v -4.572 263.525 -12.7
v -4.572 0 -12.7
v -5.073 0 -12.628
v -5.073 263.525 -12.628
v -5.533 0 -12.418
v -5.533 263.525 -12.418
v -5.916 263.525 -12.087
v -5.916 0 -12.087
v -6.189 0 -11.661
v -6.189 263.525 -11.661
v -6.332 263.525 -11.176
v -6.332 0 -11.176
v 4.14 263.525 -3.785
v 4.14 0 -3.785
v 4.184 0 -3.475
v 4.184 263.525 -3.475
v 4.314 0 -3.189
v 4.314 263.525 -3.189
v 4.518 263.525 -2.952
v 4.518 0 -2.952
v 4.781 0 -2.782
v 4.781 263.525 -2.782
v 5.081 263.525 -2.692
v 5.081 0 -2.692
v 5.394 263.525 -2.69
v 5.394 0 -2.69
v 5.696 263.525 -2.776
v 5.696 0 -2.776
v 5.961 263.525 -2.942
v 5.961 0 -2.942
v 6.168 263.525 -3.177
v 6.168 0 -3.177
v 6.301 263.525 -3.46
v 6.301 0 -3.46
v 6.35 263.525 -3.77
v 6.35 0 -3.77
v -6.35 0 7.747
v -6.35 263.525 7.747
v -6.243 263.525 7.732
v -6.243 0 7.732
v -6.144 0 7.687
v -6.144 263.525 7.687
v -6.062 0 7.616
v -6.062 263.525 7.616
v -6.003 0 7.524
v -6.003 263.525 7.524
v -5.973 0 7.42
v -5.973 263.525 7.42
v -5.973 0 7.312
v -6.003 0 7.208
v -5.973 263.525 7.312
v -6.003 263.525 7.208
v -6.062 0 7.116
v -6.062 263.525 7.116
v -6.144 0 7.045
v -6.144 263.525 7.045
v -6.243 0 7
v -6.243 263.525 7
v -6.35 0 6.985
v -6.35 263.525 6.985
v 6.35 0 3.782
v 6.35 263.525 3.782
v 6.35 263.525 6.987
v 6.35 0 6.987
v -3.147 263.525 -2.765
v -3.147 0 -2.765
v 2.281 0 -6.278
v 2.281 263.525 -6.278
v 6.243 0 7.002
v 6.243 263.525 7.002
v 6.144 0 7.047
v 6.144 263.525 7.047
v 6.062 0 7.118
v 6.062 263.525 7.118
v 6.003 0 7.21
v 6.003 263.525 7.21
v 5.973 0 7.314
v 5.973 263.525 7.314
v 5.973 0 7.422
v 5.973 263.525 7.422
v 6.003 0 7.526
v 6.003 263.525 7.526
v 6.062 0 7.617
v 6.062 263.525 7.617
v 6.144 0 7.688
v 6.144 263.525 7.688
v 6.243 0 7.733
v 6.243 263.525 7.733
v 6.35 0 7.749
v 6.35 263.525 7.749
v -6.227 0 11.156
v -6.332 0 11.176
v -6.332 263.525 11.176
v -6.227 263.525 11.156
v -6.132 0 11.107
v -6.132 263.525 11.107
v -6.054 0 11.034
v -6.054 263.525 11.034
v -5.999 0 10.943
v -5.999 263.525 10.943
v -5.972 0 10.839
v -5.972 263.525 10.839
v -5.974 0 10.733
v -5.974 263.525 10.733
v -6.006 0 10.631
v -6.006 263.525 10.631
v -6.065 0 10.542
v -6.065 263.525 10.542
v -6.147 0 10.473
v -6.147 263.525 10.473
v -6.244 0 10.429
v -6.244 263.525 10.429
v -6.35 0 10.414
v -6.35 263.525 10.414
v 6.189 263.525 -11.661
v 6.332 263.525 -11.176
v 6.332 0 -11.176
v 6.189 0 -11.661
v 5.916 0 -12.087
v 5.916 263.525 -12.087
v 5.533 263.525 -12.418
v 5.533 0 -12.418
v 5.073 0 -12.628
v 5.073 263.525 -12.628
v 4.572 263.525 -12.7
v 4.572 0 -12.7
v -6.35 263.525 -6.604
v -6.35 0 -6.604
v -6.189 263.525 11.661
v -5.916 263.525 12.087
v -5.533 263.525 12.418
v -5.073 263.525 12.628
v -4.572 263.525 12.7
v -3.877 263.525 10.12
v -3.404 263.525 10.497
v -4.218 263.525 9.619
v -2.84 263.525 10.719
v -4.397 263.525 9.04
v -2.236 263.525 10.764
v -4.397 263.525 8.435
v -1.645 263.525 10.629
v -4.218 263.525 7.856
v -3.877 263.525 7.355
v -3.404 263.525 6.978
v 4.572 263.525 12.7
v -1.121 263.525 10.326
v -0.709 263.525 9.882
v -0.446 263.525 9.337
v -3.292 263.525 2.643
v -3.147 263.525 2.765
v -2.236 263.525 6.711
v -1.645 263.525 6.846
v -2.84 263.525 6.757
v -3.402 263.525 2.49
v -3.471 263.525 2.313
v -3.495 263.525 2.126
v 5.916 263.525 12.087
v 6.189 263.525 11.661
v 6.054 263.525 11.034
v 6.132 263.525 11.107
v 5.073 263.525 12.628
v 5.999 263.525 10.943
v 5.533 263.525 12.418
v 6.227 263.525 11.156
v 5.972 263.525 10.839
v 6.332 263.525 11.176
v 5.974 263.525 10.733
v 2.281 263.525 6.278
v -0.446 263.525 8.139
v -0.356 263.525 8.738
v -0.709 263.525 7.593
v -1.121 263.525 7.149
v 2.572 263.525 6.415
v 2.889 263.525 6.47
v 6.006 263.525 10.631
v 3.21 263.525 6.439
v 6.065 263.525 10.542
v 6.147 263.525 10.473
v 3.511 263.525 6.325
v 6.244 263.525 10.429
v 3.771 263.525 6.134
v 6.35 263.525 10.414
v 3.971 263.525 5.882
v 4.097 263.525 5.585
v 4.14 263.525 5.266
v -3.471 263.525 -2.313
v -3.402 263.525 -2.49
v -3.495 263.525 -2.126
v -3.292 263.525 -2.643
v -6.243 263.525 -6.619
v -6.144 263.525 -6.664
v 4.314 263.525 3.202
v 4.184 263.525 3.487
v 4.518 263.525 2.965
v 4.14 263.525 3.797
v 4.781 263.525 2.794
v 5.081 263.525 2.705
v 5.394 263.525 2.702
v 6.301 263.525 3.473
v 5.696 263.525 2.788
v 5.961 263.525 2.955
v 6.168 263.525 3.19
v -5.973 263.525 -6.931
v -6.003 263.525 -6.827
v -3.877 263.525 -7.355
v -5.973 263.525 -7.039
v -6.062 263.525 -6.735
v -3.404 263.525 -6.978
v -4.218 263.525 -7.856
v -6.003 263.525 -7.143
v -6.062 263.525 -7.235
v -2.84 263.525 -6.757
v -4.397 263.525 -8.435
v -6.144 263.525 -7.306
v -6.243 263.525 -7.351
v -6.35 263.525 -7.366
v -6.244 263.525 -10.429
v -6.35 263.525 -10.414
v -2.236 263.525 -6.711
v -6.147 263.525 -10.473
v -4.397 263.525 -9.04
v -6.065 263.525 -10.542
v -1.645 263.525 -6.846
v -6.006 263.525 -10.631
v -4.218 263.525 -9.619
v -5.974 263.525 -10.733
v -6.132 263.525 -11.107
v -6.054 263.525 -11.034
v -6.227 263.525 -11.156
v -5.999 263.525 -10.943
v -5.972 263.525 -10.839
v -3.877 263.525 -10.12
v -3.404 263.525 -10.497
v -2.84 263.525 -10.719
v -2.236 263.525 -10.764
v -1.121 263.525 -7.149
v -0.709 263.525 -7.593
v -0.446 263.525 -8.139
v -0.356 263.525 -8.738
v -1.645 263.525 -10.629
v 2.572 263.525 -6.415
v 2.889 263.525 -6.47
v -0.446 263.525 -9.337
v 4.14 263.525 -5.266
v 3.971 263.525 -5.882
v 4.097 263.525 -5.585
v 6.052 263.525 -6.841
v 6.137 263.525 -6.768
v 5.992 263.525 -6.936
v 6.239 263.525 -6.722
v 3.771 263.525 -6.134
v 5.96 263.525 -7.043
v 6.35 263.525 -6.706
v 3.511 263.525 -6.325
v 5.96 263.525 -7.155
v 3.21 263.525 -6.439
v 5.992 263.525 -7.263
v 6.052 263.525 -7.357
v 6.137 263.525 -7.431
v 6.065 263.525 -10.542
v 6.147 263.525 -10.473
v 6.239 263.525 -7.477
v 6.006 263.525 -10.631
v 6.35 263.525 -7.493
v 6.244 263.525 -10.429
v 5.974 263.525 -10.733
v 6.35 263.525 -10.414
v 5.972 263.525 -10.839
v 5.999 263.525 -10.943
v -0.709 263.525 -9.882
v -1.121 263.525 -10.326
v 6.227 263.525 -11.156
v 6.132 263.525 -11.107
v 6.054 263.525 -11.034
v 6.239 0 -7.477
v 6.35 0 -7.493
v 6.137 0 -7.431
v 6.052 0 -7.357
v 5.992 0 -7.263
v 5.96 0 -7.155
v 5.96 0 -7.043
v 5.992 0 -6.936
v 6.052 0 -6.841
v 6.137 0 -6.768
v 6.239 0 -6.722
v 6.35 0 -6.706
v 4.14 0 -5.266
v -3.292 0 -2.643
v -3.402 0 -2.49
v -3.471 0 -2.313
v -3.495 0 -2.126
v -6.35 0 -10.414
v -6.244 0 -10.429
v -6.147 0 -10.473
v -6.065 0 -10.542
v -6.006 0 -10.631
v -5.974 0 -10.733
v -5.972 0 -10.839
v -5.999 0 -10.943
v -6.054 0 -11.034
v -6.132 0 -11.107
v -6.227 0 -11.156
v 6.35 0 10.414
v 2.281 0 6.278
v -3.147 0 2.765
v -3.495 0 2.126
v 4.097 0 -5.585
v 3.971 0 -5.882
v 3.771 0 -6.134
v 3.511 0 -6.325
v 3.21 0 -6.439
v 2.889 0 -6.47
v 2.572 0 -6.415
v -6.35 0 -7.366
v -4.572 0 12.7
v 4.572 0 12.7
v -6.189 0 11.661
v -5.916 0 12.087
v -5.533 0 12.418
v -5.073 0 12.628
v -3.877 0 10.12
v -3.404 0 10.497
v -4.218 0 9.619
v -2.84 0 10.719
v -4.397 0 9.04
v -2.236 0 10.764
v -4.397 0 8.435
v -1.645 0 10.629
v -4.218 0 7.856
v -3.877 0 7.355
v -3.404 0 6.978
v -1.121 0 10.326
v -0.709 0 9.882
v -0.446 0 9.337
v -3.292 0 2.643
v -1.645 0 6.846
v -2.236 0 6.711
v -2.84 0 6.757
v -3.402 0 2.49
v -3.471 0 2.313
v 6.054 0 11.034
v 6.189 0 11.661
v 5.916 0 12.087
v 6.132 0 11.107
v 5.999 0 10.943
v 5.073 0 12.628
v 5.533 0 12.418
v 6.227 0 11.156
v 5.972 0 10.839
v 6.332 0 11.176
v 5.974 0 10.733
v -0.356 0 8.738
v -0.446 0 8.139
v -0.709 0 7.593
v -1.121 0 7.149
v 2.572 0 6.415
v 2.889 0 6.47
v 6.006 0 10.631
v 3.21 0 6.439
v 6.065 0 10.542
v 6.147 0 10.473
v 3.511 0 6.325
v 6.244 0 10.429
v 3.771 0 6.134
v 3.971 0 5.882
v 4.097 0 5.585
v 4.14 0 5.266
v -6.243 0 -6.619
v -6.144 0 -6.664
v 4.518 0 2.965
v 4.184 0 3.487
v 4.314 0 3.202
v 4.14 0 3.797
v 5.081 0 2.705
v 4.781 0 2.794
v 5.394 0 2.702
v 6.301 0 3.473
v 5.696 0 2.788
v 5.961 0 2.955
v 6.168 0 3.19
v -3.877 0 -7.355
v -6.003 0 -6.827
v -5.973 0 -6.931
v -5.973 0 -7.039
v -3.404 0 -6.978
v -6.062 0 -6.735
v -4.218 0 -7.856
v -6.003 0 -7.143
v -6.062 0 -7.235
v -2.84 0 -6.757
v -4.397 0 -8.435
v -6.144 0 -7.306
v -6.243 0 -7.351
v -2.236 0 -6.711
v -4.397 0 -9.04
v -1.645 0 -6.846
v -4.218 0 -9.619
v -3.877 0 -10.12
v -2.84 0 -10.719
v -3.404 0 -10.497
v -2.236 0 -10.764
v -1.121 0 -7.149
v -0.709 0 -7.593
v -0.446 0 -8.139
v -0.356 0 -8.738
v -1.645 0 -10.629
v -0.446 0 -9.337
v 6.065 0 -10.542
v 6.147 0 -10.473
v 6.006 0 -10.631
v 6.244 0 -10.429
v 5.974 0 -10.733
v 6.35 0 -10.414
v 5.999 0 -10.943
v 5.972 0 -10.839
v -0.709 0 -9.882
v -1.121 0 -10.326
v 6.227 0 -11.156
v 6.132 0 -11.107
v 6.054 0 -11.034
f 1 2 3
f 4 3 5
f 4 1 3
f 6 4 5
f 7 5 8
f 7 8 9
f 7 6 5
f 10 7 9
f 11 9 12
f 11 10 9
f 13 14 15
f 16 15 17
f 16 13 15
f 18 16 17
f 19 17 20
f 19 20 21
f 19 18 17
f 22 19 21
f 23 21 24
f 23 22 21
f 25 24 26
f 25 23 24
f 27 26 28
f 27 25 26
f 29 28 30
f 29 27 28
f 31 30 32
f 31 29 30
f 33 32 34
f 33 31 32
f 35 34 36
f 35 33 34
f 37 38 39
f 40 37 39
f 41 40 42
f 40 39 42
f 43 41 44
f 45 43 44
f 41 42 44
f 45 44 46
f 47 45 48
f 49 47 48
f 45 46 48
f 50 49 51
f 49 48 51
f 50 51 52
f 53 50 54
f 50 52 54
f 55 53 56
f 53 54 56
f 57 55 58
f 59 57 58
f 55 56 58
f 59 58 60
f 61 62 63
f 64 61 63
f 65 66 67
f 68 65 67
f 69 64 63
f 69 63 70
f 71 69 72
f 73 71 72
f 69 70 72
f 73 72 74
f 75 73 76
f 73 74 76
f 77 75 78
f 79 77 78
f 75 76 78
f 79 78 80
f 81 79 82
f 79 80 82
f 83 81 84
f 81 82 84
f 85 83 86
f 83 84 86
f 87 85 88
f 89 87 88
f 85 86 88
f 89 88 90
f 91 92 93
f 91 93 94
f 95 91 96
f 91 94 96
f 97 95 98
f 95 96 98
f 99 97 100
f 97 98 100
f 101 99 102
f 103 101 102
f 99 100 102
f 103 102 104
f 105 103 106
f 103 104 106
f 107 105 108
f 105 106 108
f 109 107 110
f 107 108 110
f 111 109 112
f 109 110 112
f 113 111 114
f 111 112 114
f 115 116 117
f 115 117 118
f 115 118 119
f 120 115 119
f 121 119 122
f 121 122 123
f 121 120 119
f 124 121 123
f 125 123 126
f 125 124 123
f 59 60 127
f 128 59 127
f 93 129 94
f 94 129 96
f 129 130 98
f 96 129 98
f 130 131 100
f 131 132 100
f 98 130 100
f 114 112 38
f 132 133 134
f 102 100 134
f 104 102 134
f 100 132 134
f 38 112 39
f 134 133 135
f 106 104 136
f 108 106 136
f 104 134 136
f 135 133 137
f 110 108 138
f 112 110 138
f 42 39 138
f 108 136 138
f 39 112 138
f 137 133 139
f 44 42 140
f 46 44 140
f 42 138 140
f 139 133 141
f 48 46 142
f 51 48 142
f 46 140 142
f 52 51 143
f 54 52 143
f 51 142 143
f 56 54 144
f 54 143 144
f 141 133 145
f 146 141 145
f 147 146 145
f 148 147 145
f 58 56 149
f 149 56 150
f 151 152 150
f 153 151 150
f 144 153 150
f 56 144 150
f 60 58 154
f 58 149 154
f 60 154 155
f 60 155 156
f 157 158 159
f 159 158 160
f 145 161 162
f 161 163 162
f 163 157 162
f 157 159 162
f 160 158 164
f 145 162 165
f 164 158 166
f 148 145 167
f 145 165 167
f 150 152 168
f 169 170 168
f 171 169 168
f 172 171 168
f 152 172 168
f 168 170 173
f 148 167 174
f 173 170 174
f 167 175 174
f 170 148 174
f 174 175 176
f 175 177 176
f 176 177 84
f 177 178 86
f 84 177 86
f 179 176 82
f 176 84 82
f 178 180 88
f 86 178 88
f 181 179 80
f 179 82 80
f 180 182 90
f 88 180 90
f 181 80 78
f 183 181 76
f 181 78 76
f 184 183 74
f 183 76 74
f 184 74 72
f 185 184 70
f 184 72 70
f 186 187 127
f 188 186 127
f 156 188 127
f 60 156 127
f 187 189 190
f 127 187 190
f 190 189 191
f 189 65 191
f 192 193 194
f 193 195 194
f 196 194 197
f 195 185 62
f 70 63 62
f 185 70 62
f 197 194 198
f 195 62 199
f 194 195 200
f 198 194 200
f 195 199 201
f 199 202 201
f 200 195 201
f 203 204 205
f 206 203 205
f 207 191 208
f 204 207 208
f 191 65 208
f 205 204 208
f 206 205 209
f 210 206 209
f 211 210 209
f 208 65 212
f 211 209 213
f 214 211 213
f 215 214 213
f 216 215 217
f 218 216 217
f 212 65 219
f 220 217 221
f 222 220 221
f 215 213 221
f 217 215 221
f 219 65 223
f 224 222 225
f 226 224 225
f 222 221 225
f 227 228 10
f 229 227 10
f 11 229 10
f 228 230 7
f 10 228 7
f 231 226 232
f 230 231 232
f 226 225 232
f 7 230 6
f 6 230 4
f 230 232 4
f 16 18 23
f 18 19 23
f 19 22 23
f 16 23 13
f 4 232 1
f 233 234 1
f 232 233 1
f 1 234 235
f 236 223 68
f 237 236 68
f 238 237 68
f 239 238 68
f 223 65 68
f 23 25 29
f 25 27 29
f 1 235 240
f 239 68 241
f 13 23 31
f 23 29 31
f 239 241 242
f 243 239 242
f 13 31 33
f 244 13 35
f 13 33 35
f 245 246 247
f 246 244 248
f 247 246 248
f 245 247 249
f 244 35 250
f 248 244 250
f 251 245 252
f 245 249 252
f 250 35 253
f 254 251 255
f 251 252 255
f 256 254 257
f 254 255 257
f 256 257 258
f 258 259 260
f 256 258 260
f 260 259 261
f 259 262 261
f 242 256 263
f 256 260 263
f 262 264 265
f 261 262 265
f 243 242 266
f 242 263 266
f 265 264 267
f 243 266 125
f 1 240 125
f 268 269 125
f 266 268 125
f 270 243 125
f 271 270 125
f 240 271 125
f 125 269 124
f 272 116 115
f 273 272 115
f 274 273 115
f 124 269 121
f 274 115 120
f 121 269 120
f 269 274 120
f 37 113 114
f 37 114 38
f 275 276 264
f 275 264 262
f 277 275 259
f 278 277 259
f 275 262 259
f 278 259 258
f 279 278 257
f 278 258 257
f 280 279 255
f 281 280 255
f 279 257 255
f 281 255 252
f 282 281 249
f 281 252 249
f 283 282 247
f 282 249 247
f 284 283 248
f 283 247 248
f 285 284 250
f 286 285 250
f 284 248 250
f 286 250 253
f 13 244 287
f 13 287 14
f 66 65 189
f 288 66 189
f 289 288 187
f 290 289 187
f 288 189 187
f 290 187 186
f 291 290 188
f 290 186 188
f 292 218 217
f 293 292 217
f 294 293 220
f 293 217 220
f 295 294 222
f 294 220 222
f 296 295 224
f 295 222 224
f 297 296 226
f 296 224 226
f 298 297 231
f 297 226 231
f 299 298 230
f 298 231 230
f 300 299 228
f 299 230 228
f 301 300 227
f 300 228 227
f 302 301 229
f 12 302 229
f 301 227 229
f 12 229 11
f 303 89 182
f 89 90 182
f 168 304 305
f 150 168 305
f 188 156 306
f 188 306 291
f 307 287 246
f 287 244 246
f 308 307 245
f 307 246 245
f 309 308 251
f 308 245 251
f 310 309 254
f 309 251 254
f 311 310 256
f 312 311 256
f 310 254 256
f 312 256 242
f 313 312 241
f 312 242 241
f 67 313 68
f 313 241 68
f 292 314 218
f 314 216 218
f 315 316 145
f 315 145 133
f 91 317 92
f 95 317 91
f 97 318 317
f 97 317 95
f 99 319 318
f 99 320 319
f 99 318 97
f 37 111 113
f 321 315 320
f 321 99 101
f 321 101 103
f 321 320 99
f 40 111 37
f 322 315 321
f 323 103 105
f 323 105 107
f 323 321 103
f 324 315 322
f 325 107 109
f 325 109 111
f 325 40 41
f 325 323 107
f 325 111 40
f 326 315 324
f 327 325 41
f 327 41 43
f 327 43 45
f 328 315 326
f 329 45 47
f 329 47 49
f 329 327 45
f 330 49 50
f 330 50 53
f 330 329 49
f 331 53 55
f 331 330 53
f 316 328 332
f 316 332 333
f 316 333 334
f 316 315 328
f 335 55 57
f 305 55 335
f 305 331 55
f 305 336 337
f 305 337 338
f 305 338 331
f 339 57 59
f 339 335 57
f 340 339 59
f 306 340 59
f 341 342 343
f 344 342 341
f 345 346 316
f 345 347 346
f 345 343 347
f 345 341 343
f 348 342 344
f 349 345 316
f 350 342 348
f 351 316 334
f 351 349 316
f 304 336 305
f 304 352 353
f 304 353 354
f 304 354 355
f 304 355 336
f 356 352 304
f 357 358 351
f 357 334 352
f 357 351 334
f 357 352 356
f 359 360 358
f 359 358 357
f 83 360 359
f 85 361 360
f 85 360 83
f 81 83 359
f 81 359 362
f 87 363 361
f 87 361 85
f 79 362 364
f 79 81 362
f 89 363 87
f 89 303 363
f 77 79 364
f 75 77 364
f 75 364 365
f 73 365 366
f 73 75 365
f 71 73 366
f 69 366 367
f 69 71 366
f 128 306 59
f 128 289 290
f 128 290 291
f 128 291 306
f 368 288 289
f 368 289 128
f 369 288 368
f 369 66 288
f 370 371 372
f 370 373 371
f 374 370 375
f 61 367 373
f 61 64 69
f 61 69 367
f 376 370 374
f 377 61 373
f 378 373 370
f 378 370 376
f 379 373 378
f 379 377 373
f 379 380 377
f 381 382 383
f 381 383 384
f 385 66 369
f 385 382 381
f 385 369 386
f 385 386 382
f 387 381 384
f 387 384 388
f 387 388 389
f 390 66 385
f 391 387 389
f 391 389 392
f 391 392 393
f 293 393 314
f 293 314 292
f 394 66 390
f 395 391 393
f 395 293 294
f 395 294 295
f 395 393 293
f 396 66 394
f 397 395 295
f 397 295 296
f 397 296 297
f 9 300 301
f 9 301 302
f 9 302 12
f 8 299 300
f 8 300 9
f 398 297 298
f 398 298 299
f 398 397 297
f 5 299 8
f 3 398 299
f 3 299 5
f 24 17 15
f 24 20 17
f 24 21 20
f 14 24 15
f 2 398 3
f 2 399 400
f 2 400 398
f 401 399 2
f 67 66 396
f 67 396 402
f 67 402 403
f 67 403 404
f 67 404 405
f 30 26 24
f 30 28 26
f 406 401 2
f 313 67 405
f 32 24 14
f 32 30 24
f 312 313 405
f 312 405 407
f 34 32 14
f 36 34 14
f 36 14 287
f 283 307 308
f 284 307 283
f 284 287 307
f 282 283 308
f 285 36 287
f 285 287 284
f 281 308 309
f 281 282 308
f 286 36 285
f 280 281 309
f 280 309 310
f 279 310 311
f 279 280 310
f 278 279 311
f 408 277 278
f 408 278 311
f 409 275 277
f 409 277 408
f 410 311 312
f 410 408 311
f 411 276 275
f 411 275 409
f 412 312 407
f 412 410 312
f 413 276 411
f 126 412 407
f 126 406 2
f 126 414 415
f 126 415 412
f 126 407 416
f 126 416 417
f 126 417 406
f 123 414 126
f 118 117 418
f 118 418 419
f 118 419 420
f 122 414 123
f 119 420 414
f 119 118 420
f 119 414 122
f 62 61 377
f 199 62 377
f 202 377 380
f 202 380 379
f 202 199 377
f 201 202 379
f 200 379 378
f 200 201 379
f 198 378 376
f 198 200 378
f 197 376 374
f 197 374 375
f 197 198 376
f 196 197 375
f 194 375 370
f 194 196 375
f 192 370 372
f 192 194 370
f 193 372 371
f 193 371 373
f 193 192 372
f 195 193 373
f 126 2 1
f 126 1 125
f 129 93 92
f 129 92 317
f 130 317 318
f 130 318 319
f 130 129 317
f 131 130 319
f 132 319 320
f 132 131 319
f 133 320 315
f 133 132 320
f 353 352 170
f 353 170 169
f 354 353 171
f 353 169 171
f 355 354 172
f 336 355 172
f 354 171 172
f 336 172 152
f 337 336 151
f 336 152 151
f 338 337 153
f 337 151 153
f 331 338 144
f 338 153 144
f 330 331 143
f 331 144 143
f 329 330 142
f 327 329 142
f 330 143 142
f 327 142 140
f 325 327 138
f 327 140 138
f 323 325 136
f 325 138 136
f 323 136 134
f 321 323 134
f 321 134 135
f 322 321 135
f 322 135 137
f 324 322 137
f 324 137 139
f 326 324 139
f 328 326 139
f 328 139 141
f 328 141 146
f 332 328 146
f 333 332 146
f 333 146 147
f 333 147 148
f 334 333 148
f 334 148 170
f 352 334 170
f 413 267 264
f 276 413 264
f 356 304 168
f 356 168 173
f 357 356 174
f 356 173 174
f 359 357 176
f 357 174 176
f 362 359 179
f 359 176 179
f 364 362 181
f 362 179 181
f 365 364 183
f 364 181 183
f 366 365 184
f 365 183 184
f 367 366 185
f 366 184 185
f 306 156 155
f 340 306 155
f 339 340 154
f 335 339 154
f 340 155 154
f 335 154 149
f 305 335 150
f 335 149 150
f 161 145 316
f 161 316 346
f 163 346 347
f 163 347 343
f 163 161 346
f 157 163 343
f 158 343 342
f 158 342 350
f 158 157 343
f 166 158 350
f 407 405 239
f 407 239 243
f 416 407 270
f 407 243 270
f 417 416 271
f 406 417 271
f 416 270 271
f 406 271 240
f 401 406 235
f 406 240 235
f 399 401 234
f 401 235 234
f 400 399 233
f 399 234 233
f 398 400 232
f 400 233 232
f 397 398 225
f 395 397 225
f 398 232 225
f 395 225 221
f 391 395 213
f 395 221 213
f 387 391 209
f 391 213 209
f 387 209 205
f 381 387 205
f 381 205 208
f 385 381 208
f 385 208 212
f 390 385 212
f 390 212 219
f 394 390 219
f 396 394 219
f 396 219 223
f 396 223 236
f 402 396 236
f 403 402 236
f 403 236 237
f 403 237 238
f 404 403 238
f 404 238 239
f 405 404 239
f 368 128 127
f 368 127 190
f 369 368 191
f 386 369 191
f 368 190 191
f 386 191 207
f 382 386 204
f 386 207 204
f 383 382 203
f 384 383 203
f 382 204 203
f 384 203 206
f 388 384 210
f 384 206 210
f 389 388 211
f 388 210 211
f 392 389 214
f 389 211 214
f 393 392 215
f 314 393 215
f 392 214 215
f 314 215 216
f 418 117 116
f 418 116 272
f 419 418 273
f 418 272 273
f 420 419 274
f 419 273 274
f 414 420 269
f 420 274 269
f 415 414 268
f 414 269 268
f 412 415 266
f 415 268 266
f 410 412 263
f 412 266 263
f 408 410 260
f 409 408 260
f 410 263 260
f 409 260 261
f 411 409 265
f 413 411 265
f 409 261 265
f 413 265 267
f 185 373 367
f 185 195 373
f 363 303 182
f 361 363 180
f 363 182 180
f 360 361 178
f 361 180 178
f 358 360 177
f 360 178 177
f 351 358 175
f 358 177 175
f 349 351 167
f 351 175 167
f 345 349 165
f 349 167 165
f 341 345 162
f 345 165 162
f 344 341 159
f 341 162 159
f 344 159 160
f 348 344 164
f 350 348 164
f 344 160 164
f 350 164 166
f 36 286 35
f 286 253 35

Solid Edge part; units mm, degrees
sketch "Sketch1" plane through (0, 0, 0) normal (0, 0, 1) x (1, 0, 0)
  line L0 (0, 0) -> (0, 263.525)
  dimension "D1" = 263.525
sketch "Sketch2" plane through (0, 0, 0) normal (0, -1, 0) x (1, 0, 0)
  line L0 (4.572, 12.7) -> (-4.572, 12.7)
  arc A0 (-4.572, 12.7) -> (-6.35, 10.922) centre (-4.572, 10.922) ccw
  line L1 (-6.35, 10.922) -> (-6.35, -10.922)
  arc A1 (-4.572, -12.7) -> (-6.35, -10.922) centre (-4.572, -10.922) cw
  line L2 (-4.572, -12.7) -> (4.572, -12.7)
  arc A2 (4.572, -12.7) -> (6.35, -10.922) centre (4.572, -10.922) ccw
  line L3 (6.35, -10.922) -> (6.35, 10.922)
  arc A3 (6.35, 10.922) -> (4.572, 12.7) centre (4.572, 10.922) ccw
  dimension "D1" = 12.7
  dimension "D2" = 6.35
  dimension "D3" = 12.7
  dimension "D4" = 25.4
  dimension "D5" = 1.778
sweep "SweptProtrusion1" add profiles "Sketch2" path "Sketch1"
sketch "Sketch3" plane through (0, 0, 0) normal (0, 0, 1) x (1, 0, 0)
  line L0 (0, 0) -> (0, 263.525)
  dimension "D1" = 263.525
sketch "Sketch4" plane through (-6.35, 0, 6.35) normal (0, -1, 0) x (1, 0, 0)
  circle A0 centre (3.9624, 2.3876) radius 2.032
  dimension "D1" = 4.0639
  dimension "D2" = 3.9624
  dimension "D3" = 17.4752
  dimension "D4" = 12.7
sweep "SweptCutout1" cut profiles "Sketch4" path "Sketch3"
sketch "Sketch5" plane through (0, 0, 0) normal (0, 0, 1) x (1, 0, 0)
  line L0 (0, 0) -> (0, 263.525)
  dimension "D1" = 263.525
sketch "Sketch6" plane through (-6.35, 0, 6.35) normal (0, -1, 0) x (1, 0, 0)
  circle A0 centre (3.9624, -15.0876) radius 2.032
  dimension "D1" = 4.0639
  dimension "D2" = 3.9624
  dimension "D3" = 17.4752
  dimension "D4" = 12.7
sweep "SweptCutout2" cut profiles "Sketch6" path "Sketch5"
sketch "Sketch7" plane through (0, 0, 0) normal (0, 0, 1) x (1, 0, 0)
  line L0 (0, 0) -> (0, 263.525)
  dimension "D1" = 263.525
sketch "Sketch8" plane through (0, 0, 0) normal (0, -1, 0) x (1, 0, 0)
  line L0 (4.1402, 3.7973) -> (4.1402, 5.2661)
  arc A0 (4.1402, 5.2661) -> (2.2806, 6.2777) centre (2.9353, 5.2661) ccw
  line L1 (-3.147, 2.7652) -> (2.2806, 6.2777)
  arc A1 (-3.495, 2.1255) -> (-3.147, 2.7652) centre (-2.733, 2.1255) cw
  line L2 (-3.495, 2.1255) -> (-3.495, -2.1255)
  arc A2 (-3.495, -2.1255) -> (-3.147, -2.7652) centre (-2.733, -2.1255) ccw
  line L3 (-3.147, -2.7652) -> (2.2806, -6.2777)
  arc A3 (4.1402, -5.2661) -> (2.2806, -6.2777) centre (2.9353, -5.2661) cw
  line L4 (4.1402, -3.7846) -> (4.1402, -5.2661)
  line L5 (6.35, 3.7973) -> (6.35, -3.7846)
  arc A4 (4.1402, -3.7846) -> (6.35, -3.7846) centre (5.2451, -3.7846) cw
  arc A5 (6.35, 3.7973) -> (4.1402, 3.7973) centre (5.2451, 3.7973) cw
sweep "SweptCutout3" cut profiles "Sketch8" path "Sketch7"
sketch "Sketch9" plane through (0, 0, 0) normal (0, 0, 1) x (1, 0, 0)
  line L0 (0, 0) -> (0, 263.525)
  dimension "D1" = 263.525
sketch "Sketch10" plane through (0, 0, 0) normal (0, -1, 0) x (-1, 0, 0)
  circle A0 centre (6.35, -10.795) radius 0.381
  dimension "D1" = 0.762
  dimension "D2" = 1.905
sweep "SweptCutout4" cut profiles "Sketch10" path "Sketch9"
sketch "Sketch11" plane through (0, 0, 0) normal (0, 0, 1) x (1, 0, 0)
  line L0 (0, 0) -> (0, 263.525)
  dimension "D1" = 263.525
sketch "Sketch12" plane through (0, 0, 0) normal (0, -1, 0) x (0, 0, 1)
  circle A0 centre (7.366, 6.35) radius 0.381
  dimension "D1" = 0.762
sweep "SweptCutout5" cut profiles "Sketch12" path "Sketch11"
sketch "Sketch13" plane through (0, 0, 0) normal (0, 0, 1) x (1, 0, 0)
  line L0 (0, 0) -> (0, 263.525)
  dimension "D1" = 263.525
sketch "Sketch14" plane through (0, 0, 0) normal (0, -1, 0) x (-1, 0, 0)
  circle A0 centre (-6.35, -10.795) radius 0.381
  dimension "D1" = 0.762
  dimension "D2" = 1.905
sweep "SweptCutout6" cut profiles "Sketch14" path "Sketch13"
sketch "Sketch15" plane through (0, 0, 0) normal (0, 0, 1) x (1, 0, 0)
  line L0 (0, 0) -> (0, 263.525)
  dimension "D1" = 263.525
sketch "Sketch16" plane through (0, 0, 0) normal (0, -1, 0) x (0, 0, 1)
  circle A0 centre (7.3678, -6.35) radius 0.381
  dimension "D1" = 0.762
sweep "SweptCutout7" cut profiles "Sketch16" path "Sketch15"
sketch "Sketch17" plane through (0, 0, 0) normal (0, 0, 1) x (1, 0, 0)
  line L0 (0, 0) -> (0, 263.525)
  dimension "D1" = 263.525
sketch "Sketch18" plane through (0, 0, 0) normal (0, -1, 0) x (0, 0, -1)
  circle A0 centre (10.795, -6.35) radius 0.381
  dimension "D1" = 0.762
  dimension "D2" = 1.905
sweep "SweptCutout8" cut profiles "Sketch18" path "Sketch17"
sketch "Sketch19" plane through (0, 0, 0) normal (0, 0, 1) x (1, 0, 0)
  line L0 (0, 0) -> (0, 263.525)
  dimension "D1" = 263.525
sketch "Sketch20" plane through (0.0001, 0, 0) normal (0, -1, 0) x (0, 0, -1)
  circle A0 centre (6.985, -6.3501) radius 0.381
  dimension "D1" = 0.762
  dimension "D2" = 3.81
sweep "SweptCutout9" cut profiles "Sketch20" path "Sketch19"
sketch "Sketch21" plane through (0, 0, 0) normal (0, 0, 1) x (1, 0, 0)
  line L0 (0, 0) -> (0, 263.525)
  dimension "D1" = 263.525
sketch "Sketch22" plane through (0.0001, 0, 0) normal (0, -1, 0) x (0, 0, -1)
  circle A0 centre (10.795, 6.3499) radius 0.381
  dimension "D1" = 0.762
  dimension "D2" = 1.905
sweep "SweptCutout10" cut profiles "Sketch22" path "Sketch21"
sketch "Sketch23" plane through (0, 0, 0) normal (0, 0, 1) x (1, 0, 0)
  line L0 (0, 0) -> (0, 263.525)
  dimension "D1" = 263.525
sketch "Sketch24" plane through (0.0001, 0, 0) normal (0, -1, 0) x (0, 0, 1)
  circle A0 centre (-7.0993, -6.3499) radius 0.3937
  dimension "D1" = 0.7873
  dimension "D2" = 3.6957
sweep "SweptCutout11" cut profiles "Sketch24" path "Sketch23"
